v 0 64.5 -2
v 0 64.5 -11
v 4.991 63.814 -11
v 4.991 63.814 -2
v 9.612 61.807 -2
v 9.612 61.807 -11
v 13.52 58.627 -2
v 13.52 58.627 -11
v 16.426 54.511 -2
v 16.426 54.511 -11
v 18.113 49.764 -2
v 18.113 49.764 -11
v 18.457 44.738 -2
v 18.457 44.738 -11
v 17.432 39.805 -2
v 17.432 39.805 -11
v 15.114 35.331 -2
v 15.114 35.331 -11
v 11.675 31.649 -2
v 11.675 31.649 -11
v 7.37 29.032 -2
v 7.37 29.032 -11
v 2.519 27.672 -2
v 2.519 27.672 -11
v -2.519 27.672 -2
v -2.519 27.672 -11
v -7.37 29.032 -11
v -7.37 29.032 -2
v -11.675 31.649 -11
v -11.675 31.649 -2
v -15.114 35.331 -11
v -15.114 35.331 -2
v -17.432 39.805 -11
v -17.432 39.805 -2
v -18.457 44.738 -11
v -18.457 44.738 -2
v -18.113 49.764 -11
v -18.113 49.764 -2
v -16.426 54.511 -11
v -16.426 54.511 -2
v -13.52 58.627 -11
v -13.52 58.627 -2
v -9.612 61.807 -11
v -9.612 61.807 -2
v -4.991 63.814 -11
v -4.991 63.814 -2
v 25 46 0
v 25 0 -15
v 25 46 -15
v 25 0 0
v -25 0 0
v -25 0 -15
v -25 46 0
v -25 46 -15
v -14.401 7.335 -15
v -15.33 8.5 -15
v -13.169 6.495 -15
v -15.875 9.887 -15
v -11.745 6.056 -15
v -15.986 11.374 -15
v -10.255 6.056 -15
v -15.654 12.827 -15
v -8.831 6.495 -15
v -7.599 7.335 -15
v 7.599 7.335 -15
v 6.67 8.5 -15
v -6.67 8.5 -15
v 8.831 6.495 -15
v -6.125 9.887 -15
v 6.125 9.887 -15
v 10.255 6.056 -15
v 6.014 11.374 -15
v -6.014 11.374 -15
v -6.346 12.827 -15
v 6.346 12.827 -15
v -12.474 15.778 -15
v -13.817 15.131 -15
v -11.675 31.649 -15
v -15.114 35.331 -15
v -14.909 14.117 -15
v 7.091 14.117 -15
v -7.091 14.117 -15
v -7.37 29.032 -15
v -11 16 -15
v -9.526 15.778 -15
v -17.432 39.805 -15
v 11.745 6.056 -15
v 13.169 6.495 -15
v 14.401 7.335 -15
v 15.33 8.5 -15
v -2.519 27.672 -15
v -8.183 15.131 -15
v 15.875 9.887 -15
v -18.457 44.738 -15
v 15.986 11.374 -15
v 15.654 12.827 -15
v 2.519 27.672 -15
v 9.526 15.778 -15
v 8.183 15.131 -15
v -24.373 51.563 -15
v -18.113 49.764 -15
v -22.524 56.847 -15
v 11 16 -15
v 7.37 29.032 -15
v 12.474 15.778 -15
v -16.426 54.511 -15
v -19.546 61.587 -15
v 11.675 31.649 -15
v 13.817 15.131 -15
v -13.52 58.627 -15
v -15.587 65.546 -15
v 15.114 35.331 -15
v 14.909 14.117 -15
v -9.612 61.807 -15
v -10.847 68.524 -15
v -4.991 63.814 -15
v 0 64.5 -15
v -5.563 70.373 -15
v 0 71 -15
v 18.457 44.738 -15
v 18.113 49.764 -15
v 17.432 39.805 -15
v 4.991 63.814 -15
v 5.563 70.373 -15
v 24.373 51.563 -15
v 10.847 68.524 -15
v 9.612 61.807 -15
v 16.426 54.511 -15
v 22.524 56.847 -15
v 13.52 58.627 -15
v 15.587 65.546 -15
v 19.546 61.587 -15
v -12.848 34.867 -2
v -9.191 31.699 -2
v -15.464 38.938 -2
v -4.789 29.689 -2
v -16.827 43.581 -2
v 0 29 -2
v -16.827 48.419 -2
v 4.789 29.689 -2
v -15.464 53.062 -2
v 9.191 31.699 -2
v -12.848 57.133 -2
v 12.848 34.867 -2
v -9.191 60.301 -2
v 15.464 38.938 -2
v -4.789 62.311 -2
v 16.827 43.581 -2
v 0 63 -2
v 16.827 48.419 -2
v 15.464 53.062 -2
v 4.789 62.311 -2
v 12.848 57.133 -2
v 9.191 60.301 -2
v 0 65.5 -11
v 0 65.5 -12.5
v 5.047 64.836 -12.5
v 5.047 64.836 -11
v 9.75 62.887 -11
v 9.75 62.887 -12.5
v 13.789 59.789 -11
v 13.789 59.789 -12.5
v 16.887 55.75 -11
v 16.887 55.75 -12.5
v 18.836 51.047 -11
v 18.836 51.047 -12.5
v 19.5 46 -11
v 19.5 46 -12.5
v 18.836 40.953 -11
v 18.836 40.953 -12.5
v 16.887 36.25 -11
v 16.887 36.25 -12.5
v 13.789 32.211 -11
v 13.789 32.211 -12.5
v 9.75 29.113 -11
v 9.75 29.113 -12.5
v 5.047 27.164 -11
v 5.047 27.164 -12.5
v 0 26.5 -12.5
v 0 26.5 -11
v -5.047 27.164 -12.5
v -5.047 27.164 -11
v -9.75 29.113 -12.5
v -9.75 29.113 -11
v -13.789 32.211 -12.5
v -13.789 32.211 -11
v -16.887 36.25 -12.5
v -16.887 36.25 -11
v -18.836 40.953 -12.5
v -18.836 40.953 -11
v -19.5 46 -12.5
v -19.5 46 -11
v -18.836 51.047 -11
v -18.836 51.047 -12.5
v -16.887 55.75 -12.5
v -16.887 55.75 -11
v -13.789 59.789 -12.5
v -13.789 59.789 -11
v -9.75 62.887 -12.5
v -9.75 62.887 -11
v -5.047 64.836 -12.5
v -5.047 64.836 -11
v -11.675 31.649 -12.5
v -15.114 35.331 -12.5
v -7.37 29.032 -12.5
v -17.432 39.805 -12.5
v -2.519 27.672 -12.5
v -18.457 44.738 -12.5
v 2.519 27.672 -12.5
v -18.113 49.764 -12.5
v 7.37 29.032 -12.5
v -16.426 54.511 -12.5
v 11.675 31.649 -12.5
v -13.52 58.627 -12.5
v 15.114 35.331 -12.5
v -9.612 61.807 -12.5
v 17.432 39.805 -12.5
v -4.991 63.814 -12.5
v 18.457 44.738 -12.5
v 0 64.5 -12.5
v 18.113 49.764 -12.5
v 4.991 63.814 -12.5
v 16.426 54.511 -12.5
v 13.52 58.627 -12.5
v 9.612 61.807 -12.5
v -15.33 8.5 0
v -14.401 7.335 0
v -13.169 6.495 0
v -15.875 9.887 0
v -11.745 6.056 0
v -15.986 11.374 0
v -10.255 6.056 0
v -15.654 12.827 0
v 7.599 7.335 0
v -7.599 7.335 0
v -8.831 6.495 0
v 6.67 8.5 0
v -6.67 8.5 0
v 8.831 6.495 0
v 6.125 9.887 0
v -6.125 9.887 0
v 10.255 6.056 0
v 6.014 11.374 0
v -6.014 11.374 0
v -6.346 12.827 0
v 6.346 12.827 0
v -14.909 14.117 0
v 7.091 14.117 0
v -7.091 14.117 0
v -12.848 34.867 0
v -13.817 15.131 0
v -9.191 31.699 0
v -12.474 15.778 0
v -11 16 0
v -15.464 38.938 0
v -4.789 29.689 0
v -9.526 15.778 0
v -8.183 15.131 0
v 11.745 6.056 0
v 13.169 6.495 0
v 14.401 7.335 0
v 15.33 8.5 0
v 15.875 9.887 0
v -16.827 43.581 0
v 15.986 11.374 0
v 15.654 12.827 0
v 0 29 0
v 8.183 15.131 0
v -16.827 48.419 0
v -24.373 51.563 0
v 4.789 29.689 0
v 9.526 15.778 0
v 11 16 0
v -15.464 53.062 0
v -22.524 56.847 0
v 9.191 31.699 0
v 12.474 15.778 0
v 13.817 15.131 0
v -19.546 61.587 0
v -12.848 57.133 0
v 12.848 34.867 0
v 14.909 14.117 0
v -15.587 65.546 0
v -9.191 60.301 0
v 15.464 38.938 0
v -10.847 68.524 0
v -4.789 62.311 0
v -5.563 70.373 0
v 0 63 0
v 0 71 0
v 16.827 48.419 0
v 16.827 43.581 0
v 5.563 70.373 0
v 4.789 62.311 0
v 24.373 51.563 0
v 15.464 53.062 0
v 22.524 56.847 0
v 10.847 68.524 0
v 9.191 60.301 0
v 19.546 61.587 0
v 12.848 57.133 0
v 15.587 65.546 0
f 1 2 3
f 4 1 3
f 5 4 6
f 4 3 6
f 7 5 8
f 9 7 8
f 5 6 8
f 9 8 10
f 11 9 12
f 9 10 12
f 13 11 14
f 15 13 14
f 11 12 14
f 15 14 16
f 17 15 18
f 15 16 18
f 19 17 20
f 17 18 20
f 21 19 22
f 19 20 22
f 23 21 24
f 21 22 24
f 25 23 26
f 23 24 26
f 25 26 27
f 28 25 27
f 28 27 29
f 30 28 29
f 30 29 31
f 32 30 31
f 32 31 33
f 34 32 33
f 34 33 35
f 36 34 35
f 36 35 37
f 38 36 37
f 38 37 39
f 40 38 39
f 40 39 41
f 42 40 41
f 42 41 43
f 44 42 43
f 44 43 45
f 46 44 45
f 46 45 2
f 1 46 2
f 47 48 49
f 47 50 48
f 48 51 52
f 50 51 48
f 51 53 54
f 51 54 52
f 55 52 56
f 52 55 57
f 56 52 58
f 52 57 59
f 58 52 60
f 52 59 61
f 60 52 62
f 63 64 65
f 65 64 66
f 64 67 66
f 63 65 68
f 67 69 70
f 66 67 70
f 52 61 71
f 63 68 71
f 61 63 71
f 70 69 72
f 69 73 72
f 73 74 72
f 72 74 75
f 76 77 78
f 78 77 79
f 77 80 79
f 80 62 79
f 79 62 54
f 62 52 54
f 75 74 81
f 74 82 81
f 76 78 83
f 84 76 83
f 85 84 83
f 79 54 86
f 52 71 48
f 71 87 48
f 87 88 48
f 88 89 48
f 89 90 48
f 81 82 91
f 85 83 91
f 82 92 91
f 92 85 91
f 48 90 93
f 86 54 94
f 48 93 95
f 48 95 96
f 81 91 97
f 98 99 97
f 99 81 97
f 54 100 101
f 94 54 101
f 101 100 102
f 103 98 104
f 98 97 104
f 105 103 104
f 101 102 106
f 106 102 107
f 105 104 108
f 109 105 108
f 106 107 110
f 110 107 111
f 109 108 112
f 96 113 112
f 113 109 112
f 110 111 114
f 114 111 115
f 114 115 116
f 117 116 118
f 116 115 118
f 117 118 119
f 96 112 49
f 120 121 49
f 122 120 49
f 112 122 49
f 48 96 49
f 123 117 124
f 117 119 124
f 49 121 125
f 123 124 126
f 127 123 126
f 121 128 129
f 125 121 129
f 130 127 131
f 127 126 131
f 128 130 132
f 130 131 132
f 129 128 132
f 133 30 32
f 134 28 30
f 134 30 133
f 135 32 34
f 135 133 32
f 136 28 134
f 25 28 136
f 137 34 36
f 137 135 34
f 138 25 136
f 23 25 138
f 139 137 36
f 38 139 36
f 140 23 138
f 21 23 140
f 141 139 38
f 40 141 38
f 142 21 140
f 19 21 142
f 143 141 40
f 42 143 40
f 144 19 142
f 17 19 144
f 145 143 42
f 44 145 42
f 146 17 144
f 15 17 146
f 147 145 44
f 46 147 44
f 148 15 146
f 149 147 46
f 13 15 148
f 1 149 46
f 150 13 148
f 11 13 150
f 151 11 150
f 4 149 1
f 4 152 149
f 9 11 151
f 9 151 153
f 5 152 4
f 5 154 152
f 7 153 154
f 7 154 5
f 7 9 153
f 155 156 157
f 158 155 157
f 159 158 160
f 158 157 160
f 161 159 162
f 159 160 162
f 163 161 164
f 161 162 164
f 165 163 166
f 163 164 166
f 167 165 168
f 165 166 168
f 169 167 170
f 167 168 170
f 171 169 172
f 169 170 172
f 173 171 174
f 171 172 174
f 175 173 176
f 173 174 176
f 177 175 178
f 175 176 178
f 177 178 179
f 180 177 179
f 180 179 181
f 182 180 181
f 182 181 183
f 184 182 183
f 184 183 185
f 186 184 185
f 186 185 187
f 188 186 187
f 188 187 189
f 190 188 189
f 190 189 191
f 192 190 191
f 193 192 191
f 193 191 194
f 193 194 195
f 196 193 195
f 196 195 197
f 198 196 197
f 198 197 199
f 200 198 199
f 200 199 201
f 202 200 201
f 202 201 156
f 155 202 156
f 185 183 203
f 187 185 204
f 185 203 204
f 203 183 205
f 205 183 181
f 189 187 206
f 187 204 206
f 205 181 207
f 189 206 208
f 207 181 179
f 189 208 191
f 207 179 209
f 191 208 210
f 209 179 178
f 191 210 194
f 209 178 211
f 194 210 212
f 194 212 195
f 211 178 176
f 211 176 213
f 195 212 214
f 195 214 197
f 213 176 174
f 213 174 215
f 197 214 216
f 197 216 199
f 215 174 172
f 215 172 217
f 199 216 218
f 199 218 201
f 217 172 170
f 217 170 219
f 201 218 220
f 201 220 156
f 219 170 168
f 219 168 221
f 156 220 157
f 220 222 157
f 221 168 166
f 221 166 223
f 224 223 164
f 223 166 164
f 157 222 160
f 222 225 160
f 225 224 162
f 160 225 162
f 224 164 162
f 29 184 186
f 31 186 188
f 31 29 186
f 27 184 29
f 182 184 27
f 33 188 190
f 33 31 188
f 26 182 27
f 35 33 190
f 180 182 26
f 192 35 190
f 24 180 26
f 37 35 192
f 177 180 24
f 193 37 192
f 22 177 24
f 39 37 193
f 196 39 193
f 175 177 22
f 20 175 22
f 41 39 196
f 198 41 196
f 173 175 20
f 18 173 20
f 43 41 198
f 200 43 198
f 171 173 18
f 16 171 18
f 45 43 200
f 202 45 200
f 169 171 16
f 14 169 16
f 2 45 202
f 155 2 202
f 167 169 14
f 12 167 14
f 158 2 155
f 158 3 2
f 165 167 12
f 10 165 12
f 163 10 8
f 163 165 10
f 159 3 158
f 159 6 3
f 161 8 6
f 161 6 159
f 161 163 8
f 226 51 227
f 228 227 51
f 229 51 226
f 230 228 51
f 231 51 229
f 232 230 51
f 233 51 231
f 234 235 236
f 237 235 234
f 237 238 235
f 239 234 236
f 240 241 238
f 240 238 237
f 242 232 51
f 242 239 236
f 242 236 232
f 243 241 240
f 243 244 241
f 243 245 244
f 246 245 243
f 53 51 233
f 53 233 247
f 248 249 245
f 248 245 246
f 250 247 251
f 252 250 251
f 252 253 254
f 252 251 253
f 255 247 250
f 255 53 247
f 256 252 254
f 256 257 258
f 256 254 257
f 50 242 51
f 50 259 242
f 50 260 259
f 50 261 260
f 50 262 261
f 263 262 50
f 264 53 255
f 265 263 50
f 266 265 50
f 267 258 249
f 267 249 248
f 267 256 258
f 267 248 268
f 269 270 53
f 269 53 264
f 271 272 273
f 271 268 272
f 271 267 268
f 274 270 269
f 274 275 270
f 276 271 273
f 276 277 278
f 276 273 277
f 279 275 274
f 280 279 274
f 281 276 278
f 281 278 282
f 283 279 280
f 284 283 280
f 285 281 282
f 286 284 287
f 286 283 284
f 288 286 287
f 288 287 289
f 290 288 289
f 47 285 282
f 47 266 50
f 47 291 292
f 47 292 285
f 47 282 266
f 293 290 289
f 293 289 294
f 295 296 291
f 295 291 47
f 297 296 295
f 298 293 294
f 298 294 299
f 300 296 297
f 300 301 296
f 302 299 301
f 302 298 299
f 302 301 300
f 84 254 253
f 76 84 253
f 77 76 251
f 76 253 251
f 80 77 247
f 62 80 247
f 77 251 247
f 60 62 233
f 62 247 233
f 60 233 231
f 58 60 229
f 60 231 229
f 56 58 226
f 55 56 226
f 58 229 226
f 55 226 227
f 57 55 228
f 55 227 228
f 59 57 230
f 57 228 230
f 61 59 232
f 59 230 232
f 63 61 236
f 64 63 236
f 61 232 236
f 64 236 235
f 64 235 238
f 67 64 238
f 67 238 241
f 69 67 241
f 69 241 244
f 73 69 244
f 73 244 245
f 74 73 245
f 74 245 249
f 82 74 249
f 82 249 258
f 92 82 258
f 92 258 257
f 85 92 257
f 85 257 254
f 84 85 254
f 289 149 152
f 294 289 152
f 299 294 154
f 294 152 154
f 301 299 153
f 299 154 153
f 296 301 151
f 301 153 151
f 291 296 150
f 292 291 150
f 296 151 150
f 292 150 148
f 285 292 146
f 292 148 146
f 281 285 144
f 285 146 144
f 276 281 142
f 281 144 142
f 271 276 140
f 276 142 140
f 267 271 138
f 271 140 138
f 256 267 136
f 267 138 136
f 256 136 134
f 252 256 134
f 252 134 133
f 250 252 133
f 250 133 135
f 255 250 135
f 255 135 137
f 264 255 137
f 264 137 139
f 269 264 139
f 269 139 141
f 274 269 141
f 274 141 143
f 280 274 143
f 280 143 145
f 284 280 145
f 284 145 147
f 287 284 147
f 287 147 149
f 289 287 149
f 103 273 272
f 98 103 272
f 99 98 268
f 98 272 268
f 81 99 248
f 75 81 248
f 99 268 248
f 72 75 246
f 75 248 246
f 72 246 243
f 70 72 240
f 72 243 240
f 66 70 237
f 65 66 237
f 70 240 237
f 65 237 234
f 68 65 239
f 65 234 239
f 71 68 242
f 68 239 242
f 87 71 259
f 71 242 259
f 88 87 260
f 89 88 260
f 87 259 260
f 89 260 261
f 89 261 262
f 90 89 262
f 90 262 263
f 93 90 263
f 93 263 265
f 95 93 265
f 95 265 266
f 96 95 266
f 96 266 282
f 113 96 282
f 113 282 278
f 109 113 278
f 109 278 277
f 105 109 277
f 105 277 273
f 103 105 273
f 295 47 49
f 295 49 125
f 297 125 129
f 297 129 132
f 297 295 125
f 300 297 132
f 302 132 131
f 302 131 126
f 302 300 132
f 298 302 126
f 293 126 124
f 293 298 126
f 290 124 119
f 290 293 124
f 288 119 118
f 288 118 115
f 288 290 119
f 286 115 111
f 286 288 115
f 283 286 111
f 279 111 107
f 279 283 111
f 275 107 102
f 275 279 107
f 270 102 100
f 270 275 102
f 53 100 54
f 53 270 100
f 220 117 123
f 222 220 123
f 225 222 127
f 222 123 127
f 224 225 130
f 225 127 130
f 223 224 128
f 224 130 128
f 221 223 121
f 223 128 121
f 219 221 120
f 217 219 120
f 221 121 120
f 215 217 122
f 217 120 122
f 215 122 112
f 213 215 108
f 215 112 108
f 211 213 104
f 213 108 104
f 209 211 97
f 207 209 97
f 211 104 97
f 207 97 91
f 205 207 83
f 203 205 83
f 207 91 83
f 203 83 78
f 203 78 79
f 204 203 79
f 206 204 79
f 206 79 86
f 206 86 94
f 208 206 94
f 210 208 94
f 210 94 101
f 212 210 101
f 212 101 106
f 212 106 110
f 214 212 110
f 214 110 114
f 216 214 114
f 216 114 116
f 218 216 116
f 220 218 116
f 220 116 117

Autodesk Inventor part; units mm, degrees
sketch "Sketch_7" plane through (0, 0, 0) normal (0, 0, 1) x (1, 0, 0)
  line L0 (-25, 46) -> (-25, 0)
  line L1 (-25, 0) -> (25, 0)
  line L2 (25, 0) -> (25, 46)
  arc A0 (25, 46) -> (-25, 46) centre (0, 46) ccw
extrude "Extrusion1" add sketch "Sketch_7" against normal blind 15
sketch "Sketch_8" plane through (0, 0, 0) normal (1, 0, 0) x (0, 0, -1)
  line L0 (15, 46) -> (2, 46)
  line L1 (2, 46) -> (2, 64.5)
  line L2 (2, 64.5) -> (11, 64.5)
  line L3 (11, 64.5) -> (11, 65.5)
  line L4 (11, 65.5) -> (12.5, 65.5)
  line L5 (12.5, 65.5) -> (12.5, 64.5)
  line L6 (12.5, 64.5) -> (15, 64.5)
  line L7 (15, 64.5) -> (15, 46)
  line L8 (15, 46) -> (2, 46)
revolve "Revolution1" cut sketch "Sketch_8" angle 360 about axis through (0, 46, -15) along (0, 0, -1)
sketch "Sketch_1" plane through (0, 0, 0) normal (1, 0, 0) x (0, 0, -1)
  line L0 (15, 46) -> (0, 46)
  line L1 (0, 46) -> (0, 63)
  line L2 (0, 63) -> (15, 63)
  line L3 (15, 63) -> (15, 46)
  line L4 (15, 46) -> (0, 46)
revolve "Revolution2" cut sketch "Sketch_1" angle 360 about axis through (0, 46, -15) along (0, 0, -1)
sketch "Sketch4" plane through (0, 0, -15) normal (0, 0, -1) x (-1, 0, 0)
  point P0 (11, 11)
hole "Hole1" at (-11, 11, -15) direction (0, 0, 1) diameter 10 depth 15
pattern_linear "Rectangular Pattern1" count 2 spacing 22 along (1, 0, 0) of "Hole1"
ref_plane "to_bearing_XY" through (0, 46, -6.5) normal (0, 0, 1) x (1, 0, 0)
ref_plane "to_bearing_YZ" through (0, 46, -6.5) normal (1, 0, 0) x (0, 1, 0)
ref_plane "to_bearing_ZX" through (0, 46, -6.5) normal (0, 1, 0) x (0, 0, 1)
ref_plane "to_retaining_ring_XY" through (0, 46, -12.5) normal (0, 0, -1) x (1, 0, 0)
ref_plane "to_retaining_ring_YZ" through (0, 46, -12.5) normal (1, 0, 0) x (0, -1, 0)
ref_plane "to_retaining_ring_ZX" through (0, 46, -12.5) normal (0, -1, 0) x (0, 0, -1)
properties part number "SBGSMA6904ZZ-35_h"
